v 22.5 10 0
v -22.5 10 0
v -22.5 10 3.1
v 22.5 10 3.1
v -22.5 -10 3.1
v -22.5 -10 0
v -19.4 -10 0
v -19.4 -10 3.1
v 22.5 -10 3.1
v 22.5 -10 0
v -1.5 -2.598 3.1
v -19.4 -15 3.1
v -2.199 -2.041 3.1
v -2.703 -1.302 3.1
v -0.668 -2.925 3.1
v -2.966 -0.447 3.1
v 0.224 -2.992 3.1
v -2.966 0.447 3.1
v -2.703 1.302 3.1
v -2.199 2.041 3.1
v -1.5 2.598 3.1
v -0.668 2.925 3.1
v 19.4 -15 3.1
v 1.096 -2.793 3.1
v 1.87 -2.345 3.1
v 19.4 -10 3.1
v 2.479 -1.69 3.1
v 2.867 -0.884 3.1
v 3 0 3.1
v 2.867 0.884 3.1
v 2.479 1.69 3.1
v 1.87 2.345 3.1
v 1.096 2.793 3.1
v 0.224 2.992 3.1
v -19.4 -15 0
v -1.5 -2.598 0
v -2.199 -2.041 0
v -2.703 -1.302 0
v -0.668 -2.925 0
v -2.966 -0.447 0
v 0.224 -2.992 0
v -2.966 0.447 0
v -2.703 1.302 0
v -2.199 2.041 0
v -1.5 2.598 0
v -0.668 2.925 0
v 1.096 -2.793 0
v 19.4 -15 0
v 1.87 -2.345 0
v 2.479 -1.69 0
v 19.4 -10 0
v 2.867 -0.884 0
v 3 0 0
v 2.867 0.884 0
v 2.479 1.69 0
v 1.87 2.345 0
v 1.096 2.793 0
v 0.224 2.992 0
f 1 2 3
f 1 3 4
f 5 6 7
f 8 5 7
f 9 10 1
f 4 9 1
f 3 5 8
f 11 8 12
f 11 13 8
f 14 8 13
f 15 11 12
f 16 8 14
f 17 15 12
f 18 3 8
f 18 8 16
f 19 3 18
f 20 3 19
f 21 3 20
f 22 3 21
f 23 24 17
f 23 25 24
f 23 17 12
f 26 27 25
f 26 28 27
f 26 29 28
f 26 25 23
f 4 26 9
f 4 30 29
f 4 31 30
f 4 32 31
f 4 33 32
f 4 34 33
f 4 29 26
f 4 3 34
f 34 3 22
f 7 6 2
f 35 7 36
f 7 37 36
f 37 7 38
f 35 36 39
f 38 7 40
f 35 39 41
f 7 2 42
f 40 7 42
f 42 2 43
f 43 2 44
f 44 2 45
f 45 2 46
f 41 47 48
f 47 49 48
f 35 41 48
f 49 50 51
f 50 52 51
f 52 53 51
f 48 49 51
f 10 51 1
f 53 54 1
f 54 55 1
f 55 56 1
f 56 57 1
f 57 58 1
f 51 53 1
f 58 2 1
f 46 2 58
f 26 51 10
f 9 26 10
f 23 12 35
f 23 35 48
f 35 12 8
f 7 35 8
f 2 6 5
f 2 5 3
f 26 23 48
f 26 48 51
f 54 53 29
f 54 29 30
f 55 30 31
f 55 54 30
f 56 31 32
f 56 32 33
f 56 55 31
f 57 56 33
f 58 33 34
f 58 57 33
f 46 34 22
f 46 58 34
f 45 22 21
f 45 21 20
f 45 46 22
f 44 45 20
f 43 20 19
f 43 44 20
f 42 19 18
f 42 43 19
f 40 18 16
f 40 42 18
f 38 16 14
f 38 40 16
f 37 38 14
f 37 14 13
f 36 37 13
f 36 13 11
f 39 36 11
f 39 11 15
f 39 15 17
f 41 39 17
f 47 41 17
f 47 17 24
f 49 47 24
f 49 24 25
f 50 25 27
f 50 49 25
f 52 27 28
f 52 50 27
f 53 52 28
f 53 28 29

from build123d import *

# Parameters (mm, degrees)
SKETCH1_W           = 45
SKETCH1_H           = 20
SKETCH1_R           = 3
BOSS_EXTRUDE1_DEPTH = 3.1
SKETCH2_W           = 38.8
SKETCH2_H           = 5
BOSS_EXTRUDE2_DEPTH = 3.1


with BuildPart() as part:
    # Sketch1 → Boss-Extrude1 (new body)
    with BuildSketch(Plane.XY):
        Rectangle(SKETCH1_W, SKETCH1_H)
        Circle(SKETCH1_R, mode=Mode.SUBTRACT)
    extrude(amount=BOSS_EXTRUDE1_DEPTH)

    # Sketch2 → Boss-Extrude2 (add, through all)
    with BuildSketch(Plane.XY.offset(3.1)):
        with Locations((0, -12.5)):
            Rectangle(SKETCH2_W, SKETCH2_H)
    extrude(amount=-BOSS_EXTRUDE2_DEPTH)


solid = part.part
